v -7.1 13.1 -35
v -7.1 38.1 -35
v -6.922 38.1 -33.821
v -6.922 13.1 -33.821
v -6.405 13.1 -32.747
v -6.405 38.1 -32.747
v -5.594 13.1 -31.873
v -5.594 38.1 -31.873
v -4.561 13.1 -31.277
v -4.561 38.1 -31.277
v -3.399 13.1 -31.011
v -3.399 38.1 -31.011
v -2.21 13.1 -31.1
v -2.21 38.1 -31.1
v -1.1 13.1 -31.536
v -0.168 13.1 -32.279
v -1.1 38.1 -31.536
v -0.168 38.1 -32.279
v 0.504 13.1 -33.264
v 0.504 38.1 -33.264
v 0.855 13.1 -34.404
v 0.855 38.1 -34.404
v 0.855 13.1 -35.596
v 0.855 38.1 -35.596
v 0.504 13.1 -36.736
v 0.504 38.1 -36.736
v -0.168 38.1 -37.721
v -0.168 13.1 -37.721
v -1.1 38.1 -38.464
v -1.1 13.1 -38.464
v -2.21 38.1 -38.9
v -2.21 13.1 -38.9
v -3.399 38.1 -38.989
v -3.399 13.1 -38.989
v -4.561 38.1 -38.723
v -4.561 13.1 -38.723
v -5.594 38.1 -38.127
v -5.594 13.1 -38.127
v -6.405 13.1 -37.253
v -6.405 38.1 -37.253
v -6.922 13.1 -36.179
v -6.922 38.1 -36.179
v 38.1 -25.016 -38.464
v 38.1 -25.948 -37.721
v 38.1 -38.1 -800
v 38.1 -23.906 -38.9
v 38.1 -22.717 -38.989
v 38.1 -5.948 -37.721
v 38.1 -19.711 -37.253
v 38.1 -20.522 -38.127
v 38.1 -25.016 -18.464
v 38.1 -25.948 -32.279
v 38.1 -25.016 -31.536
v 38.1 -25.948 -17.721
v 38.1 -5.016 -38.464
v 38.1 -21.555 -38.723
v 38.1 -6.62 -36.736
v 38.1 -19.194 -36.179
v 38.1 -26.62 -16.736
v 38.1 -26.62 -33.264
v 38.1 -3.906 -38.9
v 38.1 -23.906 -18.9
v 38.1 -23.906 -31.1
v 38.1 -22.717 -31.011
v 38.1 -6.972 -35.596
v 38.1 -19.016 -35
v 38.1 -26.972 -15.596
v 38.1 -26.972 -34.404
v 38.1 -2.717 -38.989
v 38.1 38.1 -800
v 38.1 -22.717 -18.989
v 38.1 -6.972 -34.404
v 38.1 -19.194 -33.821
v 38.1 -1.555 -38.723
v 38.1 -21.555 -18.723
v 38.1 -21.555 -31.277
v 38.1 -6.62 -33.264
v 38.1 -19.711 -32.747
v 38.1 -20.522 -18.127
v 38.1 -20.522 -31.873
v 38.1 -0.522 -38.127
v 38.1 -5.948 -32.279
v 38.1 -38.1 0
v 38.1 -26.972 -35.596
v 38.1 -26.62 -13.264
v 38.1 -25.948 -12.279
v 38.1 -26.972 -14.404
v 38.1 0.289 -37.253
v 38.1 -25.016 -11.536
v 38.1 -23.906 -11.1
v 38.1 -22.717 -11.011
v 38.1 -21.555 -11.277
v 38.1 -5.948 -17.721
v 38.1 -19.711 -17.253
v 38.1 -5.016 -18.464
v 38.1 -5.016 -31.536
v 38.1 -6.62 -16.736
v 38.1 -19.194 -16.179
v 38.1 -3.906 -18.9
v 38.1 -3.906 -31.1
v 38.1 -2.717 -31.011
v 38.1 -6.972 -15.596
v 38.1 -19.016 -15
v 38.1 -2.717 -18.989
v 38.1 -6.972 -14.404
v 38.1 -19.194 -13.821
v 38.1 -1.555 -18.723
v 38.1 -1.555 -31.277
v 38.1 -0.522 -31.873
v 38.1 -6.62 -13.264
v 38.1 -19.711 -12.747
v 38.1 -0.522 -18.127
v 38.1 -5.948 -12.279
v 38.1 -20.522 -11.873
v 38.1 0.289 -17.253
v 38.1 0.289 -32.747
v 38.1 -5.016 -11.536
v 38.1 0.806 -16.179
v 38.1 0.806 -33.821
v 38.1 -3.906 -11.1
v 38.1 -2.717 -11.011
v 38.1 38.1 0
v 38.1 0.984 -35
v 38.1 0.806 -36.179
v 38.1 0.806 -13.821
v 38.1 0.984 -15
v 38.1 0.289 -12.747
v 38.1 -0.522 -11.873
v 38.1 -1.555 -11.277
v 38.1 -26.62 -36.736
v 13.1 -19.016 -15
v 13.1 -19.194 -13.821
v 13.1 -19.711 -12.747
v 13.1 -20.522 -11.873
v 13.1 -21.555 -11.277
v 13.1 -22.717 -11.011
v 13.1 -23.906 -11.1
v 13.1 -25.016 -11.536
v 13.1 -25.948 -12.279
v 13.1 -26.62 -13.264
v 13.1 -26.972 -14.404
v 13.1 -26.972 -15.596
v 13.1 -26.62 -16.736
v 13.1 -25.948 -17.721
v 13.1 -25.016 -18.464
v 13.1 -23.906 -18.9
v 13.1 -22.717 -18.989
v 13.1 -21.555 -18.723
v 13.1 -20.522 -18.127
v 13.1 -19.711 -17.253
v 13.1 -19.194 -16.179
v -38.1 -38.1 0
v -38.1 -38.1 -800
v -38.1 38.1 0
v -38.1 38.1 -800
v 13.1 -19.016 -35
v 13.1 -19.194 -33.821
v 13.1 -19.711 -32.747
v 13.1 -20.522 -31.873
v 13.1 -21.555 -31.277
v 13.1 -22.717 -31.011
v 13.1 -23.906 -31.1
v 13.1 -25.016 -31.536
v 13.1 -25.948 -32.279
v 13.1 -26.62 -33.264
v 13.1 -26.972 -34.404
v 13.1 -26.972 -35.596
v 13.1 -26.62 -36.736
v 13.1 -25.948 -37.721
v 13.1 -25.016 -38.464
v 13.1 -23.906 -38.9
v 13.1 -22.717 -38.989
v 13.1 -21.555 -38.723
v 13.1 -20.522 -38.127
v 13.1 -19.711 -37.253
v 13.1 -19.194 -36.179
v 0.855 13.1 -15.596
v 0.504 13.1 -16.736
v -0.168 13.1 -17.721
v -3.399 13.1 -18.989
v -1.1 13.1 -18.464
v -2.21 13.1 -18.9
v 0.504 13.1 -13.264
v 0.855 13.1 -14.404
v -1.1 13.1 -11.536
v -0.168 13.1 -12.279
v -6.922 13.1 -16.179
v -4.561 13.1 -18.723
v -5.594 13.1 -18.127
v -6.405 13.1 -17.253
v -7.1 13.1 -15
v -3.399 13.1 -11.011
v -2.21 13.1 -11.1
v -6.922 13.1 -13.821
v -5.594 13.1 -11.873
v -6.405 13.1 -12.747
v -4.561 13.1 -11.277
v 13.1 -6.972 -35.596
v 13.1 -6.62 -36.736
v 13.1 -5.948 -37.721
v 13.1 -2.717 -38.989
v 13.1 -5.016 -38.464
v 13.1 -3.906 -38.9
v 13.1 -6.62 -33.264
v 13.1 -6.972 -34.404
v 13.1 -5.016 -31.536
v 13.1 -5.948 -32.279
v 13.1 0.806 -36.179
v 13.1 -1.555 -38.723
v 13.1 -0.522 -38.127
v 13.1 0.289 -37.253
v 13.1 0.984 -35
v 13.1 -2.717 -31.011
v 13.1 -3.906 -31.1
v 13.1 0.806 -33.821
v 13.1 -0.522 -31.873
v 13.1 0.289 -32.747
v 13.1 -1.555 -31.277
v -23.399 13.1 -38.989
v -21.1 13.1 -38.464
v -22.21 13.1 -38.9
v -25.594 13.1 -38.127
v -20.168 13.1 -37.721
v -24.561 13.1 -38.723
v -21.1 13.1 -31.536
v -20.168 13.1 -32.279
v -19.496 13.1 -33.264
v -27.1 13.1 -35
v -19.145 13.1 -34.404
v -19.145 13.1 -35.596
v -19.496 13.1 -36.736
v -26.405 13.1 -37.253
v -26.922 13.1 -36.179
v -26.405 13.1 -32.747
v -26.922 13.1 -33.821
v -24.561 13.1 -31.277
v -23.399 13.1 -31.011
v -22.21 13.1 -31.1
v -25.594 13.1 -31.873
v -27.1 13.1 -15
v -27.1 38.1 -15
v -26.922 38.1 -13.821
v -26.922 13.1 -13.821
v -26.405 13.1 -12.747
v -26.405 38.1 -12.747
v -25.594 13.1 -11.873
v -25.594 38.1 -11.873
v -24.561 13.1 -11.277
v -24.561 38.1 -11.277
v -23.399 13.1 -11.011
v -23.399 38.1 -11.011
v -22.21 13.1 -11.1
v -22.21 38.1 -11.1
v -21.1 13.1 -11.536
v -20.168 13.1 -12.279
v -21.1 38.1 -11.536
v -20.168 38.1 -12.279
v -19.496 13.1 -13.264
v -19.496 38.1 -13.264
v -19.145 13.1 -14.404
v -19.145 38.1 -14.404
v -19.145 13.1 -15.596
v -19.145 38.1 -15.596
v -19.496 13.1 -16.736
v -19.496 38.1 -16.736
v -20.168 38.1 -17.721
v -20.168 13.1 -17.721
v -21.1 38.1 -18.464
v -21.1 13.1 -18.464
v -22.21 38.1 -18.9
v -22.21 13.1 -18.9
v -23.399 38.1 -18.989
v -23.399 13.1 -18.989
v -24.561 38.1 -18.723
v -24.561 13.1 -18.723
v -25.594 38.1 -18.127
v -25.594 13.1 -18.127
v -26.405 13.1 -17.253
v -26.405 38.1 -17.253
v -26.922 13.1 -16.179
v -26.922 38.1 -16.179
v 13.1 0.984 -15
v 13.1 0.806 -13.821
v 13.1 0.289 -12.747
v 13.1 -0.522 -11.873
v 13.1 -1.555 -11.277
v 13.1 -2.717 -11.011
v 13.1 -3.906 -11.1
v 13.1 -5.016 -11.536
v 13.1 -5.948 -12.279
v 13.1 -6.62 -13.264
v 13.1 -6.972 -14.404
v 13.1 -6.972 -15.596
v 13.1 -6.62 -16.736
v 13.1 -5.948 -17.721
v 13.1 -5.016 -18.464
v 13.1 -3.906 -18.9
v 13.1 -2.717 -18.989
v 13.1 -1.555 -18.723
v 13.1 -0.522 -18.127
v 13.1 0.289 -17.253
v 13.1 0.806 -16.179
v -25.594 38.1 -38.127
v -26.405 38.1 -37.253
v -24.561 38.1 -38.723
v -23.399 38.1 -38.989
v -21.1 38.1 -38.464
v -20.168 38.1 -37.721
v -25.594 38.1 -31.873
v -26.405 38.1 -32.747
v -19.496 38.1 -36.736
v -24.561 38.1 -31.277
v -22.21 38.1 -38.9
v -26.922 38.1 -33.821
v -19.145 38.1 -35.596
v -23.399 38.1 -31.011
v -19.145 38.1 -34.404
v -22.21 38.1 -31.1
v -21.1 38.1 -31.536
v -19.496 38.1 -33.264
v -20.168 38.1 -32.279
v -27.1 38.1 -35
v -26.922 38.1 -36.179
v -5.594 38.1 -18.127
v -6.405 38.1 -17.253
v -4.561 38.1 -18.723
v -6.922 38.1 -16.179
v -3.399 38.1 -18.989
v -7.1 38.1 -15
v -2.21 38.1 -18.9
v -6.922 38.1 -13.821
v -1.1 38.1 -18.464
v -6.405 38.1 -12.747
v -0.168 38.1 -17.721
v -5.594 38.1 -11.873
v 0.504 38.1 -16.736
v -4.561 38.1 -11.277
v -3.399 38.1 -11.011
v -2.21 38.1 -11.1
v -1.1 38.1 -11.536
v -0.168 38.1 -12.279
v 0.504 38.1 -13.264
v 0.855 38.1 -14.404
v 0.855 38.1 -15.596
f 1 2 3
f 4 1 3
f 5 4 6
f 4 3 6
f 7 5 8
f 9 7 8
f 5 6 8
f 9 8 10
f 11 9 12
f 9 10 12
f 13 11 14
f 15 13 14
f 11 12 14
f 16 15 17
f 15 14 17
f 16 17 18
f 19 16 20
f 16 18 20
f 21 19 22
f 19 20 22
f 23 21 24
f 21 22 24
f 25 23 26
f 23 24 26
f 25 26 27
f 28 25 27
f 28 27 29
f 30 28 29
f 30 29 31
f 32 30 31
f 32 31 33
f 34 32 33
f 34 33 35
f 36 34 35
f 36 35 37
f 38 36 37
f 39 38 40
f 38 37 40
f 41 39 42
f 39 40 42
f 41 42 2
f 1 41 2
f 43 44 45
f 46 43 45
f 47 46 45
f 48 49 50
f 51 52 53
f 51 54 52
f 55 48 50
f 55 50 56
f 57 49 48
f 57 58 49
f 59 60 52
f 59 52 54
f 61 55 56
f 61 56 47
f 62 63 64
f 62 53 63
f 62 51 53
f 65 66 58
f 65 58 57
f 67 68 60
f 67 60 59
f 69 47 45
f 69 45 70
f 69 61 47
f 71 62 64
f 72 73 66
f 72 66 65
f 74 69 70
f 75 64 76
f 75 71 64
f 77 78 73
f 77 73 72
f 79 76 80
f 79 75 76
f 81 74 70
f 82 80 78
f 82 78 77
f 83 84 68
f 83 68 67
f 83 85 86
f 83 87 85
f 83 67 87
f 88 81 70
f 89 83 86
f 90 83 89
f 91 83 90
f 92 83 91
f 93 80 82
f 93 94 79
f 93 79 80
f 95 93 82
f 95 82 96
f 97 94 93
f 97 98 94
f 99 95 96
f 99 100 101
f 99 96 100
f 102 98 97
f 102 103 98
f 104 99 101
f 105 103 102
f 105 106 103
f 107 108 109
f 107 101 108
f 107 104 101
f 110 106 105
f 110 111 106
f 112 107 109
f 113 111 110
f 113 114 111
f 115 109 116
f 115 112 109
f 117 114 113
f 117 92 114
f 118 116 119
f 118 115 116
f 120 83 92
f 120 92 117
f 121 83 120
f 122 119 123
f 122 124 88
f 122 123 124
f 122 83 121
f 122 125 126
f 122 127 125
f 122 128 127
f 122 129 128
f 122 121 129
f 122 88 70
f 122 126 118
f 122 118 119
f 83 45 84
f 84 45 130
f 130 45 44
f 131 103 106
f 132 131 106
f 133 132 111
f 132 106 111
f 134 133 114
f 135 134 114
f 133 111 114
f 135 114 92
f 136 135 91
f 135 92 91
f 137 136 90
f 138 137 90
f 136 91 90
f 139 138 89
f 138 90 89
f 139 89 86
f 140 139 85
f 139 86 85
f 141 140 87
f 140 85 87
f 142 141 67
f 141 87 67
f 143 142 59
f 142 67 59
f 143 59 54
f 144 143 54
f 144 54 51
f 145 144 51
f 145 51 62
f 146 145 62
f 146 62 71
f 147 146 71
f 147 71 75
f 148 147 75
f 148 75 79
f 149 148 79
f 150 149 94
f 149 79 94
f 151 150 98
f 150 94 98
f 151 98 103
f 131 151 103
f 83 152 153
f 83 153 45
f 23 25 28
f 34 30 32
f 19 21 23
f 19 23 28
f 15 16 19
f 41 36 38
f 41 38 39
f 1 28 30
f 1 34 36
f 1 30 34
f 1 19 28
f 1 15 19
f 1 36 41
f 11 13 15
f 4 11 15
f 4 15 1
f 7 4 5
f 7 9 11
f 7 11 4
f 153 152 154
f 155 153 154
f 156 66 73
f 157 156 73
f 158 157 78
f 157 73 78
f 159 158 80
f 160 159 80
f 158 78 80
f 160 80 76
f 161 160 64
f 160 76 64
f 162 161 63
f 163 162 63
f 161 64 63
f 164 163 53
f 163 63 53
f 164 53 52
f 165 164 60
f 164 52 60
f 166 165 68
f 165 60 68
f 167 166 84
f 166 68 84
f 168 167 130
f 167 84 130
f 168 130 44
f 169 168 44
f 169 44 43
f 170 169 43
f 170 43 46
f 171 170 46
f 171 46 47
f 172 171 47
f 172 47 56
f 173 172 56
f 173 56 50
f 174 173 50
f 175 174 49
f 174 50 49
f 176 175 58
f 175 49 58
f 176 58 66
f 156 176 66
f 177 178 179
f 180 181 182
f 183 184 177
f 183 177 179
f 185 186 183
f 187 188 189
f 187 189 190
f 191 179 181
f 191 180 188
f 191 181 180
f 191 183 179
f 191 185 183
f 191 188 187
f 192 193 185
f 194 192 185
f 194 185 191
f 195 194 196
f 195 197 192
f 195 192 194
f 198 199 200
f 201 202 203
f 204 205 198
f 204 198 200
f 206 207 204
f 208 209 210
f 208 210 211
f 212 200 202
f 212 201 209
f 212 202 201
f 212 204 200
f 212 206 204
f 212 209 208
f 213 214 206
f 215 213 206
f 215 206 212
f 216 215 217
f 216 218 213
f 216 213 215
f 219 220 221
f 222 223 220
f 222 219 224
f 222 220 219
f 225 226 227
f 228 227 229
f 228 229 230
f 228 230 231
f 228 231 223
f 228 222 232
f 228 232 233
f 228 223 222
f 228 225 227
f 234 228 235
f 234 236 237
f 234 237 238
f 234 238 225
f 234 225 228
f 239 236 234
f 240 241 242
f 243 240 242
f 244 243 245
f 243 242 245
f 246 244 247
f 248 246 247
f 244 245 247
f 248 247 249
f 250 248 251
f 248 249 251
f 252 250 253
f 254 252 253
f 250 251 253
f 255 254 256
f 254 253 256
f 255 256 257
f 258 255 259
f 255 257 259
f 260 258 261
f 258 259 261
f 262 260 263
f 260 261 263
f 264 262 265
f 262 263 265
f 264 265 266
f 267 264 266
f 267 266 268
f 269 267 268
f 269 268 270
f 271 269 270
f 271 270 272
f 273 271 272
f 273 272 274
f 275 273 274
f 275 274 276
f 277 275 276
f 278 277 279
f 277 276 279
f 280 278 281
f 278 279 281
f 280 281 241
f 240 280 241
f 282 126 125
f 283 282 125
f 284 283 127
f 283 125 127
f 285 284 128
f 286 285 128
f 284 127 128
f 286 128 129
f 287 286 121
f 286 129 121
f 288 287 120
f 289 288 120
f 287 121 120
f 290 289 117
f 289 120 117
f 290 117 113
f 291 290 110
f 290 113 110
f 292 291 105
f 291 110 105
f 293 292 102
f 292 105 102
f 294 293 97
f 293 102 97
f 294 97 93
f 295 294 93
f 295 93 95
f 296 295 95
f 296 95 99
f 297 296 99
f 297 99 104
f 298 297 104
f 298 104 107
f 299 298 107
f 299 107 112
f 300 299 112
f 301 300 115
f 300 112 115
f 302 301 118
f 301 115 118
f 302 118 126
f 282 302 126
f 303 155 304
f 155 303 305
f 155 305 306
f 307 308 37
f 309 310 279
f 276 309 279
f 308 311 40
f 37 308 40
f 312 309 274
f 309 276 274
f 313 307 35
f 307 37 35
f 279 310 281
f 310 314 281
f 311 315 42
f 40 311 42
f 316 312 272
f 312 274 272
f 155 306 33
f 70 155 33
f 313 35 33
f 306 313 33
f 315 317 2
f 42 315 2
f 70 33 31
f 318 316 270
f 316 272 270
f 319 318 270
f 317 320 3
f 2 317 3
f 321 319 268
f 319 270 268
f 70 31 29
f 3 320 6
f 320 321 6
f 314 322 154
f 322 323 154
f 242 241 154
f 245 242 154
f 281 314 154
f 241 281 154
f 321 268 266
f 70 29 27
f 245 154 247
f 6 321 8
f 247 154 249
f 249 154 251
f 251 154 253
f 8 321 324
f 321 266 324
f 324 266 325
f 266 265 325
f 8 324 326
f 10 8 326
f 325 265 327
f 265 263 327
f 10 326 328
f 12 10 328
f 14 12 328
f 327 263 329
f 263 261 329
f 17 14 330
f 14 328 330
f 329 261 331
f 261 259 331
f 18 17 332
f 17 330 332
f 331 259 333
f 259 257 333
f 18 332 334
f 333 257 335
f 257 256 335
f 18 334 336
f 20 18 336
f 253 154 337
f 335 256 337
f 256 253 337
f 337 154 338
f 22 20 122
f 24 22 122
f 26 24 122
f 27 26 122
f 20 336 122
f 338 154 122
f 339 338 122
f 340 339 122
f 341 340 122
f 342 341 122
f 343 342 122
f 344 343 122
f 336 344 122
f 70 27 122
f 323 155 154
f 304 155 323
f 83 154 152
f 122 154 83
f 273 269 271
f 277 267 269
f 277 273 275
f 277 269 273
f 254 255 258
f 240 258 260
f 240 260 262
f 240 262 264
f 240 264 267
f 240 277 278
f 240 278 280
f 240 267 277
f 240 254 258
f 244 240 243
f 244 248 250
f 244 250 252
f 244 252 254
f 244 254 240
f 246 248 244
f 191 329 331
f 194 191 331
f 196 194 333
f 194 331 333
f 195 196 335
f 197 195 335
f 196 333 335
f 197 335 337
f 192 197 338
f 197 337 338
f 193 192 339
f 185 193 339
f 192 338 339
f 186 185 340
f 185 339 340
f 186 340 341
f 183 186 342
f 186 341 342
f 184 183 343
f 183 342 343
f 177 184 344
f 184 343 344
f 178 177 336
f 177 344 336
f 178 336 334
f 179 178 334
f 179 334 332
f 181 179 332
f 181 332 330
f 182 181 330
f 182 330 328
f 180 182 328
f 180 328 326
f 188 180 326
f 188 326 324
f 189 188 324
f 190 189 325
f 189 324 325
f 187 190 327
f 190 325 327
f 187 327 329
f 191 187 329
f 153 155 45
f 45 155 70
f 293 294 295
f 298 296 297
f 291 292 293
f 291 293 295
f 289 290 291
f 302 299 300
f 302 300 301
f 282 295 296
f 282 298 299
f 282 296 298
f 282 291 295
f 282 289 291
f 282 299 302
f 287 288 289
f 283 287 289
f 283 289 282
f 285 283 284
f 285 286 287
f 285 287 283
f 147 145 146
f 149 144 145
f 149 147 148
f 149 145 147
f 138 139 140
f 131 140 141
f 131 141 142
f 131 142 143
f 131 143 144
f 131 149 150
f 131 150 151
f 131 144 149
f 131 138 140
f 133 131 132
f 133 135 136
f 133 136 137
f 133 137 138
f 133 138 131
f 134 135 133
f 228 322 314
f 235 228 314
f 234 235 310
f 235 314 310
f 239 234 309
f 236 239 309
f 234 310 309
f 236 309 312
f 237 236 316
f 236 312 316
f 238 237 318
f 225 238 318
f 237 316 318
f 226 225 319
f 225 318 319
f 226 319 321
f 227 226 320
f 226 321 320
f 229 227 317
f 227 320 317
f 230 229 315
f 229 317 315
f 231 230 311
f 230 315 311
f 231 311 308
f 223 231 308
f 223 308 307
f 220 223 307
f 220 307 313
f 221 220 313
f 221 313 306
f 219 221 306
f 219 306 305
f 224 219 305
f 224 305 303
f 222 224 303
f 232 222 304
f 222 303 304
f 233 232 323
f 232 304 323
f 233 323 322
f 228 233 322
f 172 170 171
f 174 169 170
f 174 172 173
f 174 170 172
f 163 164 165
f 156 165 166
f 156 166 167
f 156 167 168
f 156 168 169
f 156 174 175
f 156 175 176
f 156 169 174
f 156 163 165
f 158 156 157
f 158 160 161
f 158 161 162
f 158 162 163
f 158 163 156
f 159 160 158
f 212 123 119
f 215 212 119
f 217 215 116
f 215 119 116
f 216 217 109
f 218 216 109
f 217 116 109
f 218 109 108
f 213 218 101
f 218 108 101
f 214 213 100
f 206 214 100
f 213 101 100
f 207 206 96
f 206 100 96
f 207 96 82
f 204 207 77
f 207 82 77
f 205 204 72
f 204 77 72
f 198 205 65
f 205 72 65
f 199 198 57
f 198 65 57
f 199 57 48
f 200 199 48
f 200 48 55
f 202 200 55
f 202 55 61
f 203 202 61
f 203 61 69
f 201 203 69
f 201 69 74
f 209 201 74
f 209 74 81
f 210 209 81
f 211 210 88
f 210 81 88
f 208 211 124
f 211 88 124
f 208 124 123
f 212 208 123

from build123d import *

# Parameters (mm, degrees)
F0_W     = 76.2
F0_H     = 76.2
F1_DEPTH = 800
F2_R     = 4
F3_DEPTH = 25
F4_R     = 4
F5_DEPTH = 25


with BuildPart() as f1:
    # F0 (on Top) → F1 (new body)
    with BuildSketch(Plane.XY):
        Rectangle(F0_W, F0_H)
    extrude(amount=-F1_DEPTH)

    # F2 (on face) → F3 (cut)
    with BuildSketch(Plane.YZ.offset(38.1)):
        with Locations((-23.016181, -15)):
            Circle(F2_R)
        with Locations((-3.016181, -15)):
            Circle(F2_R)
        with Locations((-3.016181, -35)):
            Circle(F2_R)
        with Locations((-23.016181, -35)):
            Circle(F2_R)
    extrude(amount=-F3_DEPTH, mode=Mode.SUBTRACT)

    # F4 (on face) → F5 (cut)
    with BuildSketch(Plane(origin=(0, 38.1, 0), x_dir=(-1, 0, 0), z_dir=(0, 1, 0))):
        with Locations((3.1, -15)):
            Circle(F4_R)
        with Locations((23.1, -15)):
            Circle(F4_R)
        with Locations((3.1, -35)):
            Circle(F4_R)
        with Locations((23.1, -35)):
            Circle(F4_R)
    extrude(amount=-F5_DEPTH, mode=Mode.SUBTRACT)


solid = f1.part
